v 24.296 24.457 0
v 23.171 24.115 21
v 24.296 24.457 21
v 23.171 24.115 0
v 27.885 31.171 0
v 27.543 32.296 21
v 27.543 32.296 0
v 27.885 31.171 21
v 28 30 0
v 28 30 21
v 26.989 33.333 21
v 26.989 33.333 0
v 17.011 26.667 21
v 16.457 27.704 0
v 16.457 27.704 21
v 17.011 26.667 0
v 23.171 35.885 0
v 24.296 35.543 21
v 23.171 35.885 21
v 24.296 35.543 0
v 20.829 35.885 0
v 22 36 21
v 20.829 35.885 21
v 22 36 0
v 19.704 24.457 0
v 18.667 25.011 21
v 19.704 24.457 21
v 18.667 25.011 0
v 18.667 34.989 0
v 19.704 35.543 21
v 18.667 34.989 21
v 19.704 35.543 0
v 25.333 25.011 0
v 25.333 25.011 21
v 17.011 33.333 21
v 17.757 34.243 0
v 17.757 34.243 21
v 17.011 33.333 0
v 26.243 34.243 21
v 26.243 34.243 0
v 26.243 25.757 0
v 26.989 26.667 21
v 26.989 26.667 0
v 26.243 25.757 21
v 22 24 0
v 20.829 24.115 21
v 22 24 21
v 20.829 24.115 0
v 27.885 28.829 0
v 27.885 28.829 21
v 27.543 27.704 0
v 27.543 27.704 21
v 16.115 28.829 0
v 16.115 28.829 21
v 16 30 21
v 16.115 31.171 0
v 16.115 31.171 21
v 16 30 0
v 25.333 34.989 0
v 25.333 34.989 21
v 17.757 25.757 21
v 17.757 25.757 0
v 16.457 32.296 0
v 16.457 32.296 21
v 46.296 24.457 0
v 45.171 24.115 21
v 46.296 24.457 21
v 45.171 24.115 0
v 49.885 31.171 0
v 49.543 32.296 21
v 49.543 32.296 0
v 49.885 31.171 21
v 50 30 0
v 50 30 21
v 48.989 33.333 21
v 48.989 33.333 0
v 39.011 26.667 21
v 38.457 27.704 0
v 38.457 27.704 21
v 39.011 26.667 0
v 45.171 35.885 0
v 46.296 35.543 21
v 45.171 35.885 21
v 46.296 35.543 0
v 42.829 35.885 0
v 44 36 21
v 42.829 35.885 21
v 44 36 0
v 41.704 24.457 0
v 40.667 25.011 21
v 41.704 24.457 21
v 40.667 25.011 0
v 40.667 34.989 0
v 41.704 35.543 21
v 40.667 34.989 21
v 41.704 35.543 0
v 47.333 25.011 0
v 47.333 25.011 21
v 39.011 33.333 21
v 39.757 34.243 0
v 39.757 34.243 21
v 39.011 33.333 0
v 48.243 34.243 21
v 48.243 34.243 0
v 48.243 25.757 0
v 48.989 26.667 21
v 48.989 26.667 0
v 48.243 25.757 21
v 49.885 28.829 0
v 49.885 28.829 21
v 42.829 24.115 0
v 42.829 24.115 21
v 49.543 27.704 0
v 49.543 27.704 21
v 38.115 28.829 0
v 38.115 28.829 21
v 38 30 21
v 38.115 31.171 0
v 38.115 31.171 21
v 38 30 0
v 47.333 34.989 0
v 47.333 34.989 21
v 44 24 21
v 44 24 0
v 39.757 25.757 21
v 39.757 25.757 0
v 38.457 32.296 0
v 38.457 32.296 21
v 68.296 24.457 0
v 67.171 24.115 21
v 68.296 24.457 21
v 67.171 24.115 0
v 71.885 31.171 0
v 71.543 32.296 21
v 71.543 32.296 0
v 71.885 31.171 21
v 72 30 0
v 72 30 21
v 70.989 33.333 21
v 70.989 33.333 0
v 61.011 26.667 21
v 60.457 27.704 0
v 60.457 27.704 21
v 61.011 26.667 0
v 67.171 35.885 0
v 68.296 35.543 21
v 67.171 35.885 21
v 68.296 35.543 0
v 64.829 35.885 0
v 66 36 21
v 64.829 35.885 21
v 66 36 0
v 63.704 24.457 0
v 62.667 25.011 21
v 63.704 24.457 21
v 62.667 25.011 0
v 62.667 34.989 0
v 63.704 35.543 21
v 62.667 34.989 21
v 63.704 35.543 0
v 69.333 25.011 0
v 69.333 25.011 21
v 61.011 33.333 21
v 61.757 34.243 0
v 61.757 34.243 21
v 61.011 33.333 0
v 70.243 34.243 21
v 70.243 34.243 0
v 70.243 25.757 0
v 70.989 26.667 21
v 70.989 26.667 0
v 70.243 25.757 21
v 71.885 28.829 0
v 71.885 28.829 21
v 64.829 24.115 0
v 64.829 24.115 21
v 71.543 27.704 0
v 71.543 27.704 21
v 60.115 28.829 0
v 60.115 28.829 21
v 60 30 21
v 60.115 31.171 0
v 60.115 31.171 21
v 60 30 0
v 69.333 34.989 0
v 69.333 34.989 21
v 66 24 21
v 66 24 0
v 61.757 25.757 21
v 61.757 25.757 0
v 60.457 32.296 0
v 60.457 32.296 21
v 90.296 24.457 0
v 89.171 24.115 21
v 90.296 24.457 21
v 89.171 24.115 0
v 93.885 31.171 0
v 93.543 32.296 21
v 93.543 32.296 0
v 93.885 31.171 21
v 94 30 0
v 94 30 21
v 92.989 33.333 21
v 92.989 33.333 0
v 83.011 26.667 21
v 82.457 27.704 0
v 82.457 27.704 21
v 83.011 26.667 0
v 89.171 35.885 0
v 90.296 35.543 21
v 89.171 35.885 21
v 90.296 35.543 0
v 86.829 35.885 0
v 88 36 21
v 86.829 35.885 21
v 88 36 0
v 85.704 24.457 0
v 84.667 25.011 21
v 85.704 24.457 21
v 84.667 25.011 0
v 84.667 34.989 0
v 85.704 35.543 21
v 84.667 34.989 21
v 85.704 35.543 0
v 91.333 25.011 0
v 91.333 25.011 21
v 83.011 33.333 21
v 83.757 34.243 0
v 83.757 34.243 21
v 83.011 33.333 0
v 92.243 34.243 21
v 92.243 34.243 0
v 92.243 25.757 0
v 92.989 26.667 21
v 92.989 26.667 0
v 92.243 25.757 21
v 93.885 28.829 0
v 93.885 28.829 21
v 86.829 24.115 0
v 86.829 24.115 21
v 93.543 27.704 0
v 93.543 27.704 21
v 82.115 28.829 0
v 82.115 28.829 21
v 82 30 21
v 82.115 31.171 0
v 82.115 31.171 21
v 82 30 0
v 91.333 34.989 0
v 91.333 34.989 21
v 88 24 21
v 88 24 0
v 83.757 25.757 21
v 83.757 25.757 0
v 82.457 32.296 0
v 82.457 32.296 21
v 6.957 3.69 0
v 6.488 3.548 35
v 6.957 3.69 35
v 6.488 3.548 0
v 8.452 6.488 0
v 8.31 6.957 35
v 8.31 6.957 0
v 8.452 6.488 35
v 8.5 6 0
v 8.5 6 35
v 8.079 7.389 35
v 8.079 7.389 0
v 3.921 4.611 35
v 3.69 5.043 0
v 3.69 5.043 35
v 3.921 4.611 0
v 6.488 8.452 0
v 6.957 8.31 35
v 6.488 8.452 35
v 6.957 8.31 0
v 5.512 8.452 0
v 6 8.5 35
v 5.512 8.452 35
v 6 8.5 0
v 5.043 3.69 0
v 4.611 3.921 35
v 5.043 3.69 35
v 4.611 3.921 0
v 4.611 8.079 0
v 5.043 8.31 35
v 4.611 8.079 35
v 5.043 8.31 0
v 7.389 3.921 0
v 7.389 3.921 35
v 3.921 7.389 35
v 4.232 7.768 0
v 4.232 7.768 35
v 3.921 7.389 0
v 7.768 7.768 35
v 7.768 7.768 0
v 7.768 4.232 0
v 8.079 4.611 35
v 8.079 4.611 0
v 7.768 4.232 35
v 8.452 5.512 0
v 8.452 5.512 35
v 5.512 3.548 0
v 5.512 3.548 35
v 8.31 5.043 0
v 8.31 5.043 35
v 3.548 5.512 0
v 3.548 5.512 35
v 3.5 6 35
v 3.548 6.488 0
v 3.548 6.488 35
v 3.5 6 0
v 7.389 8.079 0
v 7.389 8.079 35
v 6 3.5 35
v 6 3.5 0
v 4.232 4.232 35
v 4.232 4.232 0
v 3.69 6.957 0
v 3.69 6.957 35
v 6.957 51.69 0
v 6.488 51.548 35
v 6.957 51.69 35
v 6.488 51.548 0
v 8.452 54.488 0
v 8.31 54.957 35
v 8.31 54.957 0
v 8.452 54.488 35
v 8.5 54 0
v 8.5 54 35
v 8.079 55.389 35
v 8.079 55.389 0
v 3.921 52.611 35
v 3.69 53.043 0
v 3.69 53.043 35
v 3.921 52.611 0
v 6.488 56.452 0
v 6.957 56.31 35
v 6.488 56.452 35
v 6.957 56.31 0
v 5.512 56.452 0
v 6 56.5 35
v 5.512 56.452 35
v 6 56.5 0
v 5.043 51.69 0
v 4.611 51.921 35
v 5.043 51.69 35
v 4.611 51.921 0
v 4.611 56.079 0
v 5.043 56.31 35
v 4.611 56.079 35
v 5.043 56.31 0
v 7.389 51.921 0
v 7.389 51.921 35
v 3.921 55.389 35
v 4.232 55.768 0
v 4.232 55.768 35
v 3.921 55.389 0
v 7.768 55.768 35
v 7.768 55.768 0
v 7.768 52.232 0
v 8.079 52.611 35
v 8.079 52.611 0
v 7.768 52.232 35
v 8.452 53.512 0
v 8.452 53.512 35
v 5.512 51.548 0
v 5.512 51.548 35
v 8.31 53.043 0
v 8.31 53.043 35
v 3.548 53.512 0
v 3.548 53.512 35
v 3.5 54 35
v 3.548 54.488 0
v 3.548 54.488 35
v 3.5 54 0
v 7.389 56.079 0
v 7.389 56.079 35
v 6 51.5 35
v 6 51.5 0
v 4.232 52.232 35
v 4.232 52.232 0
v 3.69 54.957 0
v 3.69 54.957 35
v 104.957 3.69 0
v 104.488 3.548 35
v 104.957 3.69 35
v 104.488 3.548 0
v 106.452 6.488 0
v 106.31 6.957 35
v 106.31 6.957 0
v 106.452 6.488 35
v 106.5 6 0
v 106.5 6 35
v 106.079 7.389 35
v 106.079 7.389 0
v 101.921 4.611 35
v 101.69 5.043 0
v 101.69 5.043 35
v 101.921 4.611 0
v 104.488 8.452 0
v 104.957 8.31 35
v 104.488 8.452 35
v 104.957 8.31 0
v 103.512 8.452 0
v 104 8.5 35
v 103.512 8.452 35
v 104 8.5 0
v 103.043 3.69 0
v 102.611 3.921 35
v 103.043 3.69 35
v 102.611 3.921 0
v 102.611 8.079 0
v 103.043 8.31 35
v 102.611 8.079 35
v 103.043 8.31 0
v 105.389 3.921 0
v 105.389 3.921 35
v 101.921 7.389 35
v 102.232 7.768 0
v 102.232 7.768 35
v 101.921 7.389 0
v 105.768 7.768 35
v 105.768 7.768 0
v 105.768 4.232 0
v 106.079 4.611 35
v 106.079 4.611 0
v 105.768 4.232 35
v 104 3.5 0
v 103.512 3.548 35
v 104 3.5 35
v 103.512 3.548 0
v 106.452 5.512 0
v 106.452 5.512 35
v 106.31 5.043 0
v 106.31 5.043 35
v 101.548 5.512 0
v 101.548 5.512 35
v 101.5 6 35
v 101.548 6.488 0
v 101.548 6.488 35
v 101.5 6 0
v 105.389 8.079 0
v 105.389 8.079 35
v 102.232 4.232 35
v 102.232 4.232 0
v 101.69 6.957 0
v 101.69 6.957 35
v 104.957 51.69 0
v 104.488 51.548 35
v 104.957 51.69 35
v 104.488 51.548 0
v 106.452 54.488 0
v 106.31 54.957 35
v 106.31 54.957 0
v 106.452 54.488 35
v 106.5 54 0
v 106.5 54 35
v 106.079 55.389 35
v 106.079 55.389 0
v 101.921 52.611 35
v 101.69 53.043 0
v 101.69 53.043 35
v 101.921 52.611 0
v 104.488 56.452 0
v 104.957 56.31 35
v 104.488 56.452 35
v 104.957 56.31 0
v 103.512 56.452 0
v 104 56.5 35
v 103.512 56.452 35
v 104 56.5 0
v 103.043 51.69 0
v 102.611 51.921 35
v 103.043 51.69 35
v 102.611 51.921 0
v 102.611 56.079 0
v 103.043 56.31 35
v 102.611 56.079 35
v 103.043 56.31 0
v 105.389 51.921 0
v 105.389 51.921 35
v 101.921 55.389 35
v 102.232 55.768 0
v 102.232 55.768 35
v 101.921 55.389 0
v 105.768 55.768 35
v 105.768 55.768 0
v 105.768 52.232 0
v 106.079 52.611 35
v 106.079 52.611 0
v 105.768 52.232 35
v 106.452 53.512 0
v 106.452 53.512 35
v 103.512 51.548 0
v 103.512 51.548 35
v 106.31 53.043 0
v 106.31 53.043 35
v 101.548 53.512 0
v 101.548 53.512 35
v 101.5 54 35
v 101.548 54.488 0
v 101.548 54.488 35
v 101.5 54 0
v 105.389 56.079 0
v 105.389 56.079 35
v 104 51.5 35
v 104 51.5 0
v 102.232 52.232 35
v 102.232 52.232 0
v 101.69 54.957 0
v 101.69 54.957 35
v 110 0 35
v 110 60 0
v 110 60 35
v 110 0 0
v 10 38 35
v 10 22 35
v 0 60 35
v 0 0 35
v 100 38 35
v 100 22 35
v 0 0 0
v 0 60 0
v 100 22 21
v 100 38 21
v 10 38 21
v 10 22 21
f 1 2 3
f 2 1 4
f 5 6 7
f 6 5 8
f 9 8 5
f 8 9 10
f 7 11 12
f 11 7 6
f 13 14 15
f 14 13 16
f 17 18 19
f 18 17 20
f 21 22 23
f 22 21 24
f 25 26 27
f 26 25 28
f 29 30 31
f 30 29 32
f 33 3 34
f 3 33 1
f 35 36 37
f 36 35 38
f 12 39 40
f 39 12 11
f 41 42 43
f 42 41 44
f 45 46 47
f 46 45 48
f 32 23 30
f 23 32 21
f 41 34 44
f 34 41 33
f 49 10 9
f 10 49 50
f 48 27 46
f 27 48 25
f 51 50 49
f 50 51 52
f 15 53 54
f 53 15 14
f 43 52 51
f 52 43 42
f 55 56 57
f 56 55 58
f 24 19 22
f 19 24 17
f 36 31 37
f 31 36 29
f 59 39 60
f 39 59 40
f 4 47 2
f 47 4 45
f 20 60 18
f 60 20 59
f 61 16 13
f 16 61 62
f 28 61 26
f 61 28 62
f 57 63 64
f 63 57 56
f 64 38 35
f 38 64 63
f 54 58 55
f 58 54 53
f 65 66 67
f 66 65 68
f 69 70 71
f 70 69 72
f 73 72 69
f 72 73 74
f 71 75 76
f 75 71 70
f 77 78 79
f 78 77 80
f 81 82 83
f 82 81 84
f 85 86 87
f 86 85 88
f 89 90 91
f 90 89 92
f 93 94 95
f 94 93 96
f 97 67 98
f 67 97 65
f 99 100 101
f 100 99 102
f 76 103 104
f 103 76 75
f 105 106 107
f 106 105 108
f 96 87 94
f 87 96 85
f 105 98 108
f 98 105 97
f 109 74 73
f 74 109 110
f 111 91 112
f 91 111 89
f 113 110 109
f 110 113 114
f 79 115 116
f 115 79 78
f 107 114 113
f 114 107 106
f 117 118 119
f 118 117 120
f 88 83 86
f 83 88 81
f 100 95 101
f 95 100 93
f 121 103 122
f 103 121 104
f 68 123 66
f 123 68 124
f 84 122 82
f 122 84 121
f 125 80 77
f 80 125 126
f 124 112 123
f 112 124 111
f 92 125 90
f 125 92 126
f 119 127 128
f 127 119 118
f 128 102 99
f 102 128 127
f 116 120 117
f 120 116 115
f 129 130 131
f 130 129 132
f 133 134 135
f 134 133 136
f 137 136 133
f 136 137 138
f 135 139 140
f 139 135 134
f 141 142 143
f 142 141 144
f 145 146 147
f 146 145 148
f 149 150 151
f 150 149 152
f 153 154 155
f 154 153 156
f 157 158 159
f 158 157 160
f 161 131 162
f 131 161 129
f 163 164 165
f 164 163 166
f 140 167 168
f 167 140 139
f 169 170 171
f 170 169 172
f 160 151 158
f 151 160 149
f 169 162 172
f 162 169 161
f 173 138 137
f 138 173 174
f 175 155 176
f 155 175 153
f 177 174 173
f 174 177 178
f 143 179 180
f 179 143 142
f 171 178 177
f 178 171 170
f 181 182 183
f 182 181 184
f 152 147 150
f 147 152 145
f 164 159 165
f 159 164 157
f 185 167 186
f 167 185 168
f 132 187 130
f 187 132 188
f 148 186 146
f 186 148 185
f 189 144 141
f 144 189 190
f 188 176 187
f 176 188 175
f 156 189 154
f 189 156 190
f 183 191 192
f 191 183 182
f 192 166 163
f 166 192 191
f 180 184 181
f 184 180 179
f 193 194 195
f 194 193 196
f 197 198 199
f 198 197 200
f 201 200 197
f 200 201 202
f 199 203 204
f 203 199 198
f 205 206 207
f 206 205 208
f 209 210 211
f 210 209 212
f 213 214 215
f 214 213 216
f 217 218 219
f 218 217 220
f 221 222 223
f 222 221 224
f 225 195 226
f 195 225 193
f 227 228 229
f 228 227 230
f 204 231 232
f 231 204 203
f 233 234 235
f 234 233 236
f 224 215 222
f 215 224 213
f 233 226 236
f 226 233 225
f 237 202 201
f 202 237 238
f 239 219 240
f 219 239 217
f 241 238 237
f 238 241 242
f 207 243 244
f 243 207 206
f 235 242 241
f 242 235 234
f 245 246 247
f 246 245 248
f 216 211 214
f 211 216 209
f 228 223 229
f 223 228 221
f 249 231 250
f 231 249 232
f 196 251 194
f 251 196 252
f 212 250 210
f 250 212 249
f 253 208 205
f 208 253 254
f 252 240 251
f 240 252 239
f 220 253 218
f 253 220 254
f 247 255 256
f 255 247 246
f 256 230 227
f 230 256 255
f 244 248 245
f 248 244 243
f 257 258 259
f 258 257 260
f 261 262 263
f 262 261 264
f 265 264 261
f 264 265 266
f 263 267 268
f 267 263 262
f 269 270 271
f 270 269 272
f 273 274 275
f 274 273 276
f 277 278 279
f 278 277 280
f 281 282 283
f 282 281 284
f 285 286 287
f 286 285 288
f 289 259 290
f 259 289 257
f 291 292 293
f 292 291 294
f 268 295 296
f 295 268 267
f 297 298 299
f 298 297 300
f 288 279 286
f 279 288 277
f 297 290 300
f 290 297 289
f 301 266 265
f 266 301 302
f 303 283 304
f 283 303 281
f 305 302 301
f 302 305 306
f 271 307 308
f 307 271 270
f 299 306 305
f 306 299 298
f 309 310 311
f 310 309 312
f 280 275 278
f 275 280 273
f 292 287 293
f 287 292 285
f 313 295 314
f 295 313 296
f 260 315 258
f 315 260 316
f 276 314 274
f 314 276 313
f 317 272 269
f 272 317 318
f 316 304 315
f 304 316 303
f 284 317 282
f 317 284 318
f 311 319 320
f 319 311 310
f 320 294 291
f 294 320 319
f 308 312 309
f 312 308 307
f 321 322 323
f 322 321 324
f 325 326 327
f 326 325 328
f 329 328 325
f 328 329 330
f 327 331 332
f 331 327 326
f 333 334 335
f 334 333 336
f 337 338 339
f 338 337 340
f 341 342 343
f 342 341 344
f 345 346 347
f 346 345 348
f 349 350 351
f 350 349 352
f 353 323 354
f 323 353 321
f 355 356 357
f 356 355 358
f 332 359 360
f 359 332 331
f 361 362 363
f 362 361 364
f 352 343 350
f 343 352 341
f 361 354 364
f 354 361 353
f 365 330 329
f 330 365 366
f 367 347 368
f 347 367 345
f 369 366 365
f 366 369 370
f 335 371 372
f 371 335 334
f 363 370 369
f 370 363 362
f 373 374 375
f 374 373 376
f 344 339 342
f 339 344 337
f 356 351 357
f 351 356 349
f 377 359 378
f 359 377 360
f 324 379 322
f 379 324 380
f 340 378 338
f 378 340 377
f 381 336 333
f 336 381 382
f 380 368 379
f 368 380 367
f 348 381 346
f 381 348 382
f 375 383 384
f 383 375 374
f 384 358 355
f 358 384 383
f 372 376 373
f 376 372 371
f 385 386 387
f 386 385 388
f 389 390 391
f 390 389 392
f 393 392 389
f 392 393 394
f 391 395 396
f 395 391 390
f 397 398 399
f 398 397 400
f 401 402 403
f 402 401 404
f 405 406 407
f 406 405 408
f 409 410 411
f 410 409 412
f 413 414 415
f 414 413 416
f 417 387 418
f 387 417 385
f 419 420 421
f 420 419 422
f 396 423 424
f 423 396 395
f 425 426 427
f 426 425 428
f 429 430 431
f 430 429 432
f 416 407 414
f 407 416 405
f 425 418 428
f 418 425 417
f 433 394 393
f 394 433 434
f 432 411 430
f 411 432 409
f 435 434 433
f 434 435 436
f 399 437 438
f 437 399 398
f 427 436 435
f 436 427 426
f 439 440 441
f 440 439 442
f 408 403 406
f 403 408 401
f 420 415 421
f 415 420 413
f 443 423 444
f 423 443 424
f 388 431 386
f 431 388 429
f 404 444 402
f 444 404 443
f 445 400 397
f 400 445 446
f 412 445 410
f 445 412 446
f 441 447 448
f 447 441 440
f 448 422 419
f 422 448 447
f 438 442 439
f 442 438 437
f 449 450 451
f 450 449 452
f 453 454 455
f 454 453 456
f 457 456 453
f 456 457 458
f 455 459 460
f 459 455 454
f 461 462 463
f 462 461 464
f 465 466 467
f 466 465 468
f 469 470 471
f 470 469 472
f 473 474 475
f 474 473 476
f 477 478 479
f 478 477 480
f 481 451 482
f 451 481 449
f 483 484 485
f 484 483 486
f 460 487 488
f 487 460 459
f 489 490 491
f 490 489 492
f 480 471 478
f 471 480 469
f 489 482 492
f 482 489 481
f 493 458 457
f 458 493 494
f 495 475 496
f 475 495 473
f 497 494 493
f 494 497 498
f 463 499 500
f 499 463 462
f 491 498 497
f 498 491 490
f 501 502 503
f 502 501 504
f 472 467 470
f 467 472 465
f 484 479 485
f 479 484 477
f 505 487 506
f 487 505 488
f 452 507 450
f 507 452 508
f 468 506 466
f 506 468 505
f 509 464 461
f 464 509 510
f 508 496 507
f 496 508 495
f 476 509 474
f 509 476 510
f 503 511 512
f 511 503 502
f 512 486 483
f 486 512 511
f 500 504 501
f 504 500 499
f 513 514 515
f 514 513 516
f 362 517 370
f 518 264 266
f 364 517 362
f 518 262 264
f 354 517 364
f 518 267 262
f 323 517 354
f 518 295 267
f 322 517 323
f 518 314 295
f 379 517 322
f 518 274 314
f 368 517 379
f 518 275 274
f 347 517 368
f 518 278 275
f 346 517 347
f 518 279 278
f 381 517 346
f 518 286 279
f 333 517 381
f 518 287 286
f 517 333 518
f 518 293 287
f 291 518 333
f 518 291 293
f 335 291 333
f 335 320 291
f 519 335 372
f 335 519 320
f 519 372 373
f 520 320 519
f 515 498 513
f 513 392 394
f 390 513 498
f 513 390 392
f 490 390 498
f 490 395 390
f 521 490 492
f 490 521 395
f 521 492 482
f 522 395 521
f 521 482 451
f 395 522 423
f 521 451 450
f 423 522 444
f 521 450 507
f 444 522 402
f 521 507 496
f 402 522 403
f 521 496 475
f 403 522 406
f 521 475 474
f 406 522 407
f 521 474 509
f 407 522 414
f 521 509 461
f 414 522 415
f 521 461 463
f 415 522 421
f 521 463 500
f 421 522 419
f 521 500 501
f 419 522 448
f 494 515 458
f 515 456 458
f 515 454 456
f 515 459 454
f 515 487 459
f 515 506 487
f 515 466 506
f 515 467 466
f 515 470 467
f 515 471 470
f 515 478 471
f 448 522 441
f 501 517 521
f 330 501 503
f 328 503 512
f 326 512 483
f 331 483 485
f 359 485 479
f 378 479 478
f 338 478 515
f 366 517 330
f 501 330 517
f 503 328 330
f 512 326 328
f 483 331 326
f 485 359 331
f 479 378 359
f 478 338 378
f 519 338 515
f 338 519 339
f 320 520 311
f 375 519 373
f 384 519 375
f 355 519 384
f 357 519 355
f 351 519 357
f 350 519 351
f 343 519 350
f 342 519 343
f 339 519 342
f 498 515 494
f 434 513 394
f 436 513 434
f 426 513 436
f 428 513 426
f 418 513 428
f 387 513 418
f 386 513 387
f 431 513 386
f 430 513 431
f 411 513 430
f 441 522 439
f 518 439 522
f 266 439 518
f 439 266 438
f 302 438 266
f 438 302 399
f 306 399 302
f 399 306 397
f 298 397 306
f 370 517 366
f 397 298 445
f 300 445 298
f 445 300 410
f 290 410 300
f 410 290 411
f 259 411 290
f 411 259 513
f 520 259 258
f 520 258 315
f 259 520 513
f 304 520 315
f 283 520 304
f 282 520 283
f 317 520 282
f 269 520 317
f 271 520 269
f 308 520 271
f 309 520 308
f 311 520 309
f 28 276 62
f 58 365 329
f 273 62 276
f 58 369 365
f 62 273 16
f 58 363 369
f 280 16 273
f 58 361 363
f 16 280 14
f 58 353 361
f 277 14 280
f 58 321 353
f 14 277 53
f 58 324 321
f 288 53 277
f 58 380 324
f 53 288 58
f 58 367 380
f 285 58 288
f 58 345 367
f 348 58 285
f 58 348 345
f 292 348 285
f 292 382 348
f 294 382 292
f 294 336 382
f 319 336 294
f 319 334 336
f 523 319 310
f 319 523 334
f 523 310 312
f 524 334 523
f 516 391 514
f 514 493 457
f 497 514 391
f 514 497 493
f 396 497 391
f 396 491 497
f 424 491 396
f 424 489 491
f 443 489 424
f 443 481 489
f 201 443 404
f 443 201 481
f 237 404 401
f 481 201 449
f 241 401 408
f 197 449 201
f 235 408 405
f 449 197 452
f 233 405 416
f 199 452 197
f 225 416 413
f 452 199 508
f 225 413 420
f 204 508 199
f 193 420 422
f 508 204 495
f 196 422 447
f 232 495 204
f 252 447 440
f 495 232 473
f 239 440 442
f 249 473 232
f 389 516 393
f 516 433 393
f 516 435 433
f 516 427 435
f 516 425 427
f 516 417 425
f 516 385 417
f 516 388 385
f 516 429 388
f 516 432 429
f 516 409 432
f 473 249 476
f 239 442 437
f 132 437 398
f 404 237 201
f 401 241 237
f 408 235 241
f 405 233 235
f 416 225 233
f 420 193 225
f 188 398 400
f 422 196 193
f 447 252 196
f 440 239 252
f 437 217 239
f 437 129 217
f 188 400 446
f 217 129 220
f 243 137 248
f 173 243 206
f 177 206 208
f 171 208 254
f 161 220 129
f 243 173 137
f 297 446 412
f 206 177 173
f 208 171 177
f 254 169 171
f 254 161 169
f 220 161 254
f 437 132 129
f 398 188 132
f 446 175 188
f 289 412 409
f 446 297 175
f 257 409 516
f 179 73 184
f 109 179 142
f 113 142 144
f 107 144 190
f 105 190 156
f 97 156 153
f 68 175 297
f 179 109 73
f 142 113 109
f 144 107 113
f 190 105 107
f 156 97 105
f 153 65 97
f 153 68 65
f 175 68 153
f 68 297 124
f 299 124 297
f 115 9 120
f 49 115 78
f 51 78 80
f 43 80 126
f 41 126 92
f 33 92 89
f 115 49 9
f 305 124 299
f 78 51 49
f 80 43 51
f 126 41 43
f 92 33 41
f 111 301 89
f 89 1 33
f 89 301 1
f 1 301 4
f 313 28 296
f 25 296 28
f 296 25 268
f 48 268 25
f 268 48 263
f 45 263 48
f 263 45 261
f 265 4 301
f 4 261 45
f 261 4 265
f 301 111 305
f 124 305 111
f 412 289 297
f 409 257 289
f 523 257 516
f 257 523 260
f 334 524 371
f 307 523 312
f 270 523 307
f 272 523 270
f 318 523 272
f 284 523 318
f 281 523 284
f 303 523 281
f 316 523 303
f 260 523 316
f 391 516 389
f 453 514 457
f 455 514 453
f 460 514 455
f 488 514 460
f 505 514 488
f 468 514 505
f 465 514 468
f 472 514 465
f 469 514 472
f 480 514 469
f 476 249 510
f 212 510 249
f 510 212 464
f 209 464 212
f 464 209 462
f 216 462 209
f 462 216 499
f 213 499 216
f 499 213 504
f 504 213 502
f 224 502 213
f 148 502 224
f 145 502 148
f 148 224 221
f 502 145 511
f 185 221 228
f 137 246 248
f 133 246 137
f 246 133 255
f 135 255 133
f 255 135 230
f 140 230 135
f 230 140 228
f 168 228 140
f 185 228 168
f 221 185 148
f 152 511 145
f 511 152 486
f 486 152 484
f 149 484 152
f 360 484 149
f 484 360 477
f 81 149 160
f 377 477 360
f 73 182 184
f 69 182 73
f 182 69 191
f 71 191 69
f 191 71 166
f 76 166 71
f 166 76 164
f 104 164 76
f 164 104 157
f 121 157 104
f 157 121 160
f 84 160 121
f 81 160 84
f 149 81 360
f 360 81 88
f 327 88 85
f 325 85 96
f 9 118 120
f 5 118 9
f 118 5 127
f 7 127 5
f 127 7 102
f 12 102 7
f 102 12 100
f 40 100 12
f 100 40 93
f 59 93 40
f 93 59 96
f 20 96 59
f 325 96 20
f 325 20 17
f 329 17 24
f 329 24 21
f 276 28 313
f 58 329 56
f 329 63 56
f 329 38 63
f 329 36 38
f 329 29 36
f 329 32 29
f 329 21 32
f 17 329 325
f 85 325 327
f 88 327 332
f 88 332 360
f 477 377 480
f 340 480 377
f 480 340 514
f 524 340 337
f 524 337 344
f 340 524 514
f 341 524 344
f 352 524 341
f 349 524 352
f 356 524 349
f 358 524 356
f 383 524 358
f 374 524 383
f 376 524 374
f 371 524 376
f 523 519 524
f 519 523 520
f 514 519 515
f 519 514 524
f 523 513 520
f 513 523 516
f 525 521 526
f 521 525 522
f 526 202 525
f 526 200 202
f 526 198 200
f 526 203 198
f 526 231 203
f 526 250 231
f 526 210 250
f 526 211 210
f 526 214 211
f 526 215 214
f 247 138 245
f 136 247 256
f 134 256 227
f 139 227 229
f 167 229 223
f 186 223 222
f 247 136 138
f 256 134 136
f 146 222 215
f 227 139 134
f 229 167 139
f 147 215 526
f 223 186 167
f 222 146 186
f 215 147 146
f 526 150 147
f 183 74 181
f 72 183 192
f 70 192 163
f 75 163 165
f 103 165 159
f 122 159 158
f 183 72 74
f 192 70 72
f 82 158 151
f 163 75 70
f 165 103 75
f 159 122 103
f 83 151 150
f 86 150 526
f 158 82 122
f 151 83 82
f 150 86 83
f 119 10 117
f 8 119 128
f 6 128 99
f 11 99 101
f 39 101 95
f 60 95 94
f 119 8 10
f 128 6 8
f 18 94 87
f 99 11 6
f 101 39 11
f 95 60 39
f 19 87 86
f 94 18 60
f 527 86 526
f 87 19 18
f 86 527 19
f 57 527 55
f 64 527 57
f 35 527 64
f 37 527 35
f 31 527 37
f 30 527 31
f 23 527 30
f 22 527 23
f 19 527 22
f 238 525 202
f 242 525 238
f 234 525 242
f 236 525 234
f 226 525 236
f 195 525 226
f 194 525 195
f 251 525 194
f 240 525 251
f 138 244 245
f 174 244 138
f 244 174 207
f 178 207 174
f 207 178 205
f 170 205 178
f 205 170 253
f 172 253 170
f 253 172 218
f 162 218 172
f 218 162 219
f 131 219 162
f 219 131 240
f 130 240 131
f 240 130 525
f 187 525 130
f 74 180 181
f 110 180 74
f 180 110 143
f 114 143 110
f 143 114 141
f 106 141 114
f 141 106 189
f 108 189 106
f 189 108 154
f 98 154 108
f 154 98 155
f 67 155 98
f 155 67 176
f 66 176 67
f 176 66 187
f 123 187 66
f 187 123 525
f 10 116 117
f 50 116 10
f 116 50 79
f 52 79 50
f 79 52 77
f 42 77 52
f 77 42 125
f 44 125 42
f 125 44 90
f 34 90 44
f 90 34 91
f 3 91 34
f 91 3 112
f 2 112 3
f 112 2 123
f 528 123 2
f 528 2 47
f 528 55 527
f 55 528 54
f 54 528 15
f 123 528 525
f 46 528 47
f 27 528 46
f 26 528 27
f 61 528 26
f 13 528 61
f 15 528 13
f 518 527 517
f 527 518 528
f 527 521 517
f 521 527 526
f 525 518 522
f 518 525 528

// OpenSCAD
$fn = 32;

// ----------------------------------------------------------------------
// Manifold block: gallery_top manifold
// ----------------------------------------------------------------------

// --- parameters (mm) ---
block_l = 110;            // block length, X
block_w = 60;             // block width, Y
block_h = 35;             // block height, Z
port_d = 12;              // port bore diameter
port_pitch = 22;          // port pitch along X
gallery_d = 16;           // top gallery width, Y
gallery_depth = 14;       // gallery pocket depth
wall_p = 10;              // gallery end wall thickness, X
mnt_d = 5;                // mounting hole diameter
mnt_in = 6;               // mounting hole inset from the edges

n_ports = 4;  // ports in the row
port_x0 = (block_l - (n_ports - 1) * port_pitch) / 2;  // first port X

difference() {
  cube([block_l, block_w, block_h]);
  for (i = [0 : n_ports - 1])
    translate([port_x0 + i * port_pitch, block_w / 2, -1])
      cylinder(h = block_h + 2, d = port_d);
  translate([wall_p, block_w / 2 - gallery_d / 2, block_h - gallery_depth])
    cube([block_l - 2 * wall_p, gallery_d, gallery_depth + 1]);
  for (cx = [mnt_in, block_l - mnt_in])
    for (cy = [mnt_in, block_w - mnt_in])
      translate([cx, cy, -1]) cylinder(h = block_h + 2, d = mnt_d);
}
